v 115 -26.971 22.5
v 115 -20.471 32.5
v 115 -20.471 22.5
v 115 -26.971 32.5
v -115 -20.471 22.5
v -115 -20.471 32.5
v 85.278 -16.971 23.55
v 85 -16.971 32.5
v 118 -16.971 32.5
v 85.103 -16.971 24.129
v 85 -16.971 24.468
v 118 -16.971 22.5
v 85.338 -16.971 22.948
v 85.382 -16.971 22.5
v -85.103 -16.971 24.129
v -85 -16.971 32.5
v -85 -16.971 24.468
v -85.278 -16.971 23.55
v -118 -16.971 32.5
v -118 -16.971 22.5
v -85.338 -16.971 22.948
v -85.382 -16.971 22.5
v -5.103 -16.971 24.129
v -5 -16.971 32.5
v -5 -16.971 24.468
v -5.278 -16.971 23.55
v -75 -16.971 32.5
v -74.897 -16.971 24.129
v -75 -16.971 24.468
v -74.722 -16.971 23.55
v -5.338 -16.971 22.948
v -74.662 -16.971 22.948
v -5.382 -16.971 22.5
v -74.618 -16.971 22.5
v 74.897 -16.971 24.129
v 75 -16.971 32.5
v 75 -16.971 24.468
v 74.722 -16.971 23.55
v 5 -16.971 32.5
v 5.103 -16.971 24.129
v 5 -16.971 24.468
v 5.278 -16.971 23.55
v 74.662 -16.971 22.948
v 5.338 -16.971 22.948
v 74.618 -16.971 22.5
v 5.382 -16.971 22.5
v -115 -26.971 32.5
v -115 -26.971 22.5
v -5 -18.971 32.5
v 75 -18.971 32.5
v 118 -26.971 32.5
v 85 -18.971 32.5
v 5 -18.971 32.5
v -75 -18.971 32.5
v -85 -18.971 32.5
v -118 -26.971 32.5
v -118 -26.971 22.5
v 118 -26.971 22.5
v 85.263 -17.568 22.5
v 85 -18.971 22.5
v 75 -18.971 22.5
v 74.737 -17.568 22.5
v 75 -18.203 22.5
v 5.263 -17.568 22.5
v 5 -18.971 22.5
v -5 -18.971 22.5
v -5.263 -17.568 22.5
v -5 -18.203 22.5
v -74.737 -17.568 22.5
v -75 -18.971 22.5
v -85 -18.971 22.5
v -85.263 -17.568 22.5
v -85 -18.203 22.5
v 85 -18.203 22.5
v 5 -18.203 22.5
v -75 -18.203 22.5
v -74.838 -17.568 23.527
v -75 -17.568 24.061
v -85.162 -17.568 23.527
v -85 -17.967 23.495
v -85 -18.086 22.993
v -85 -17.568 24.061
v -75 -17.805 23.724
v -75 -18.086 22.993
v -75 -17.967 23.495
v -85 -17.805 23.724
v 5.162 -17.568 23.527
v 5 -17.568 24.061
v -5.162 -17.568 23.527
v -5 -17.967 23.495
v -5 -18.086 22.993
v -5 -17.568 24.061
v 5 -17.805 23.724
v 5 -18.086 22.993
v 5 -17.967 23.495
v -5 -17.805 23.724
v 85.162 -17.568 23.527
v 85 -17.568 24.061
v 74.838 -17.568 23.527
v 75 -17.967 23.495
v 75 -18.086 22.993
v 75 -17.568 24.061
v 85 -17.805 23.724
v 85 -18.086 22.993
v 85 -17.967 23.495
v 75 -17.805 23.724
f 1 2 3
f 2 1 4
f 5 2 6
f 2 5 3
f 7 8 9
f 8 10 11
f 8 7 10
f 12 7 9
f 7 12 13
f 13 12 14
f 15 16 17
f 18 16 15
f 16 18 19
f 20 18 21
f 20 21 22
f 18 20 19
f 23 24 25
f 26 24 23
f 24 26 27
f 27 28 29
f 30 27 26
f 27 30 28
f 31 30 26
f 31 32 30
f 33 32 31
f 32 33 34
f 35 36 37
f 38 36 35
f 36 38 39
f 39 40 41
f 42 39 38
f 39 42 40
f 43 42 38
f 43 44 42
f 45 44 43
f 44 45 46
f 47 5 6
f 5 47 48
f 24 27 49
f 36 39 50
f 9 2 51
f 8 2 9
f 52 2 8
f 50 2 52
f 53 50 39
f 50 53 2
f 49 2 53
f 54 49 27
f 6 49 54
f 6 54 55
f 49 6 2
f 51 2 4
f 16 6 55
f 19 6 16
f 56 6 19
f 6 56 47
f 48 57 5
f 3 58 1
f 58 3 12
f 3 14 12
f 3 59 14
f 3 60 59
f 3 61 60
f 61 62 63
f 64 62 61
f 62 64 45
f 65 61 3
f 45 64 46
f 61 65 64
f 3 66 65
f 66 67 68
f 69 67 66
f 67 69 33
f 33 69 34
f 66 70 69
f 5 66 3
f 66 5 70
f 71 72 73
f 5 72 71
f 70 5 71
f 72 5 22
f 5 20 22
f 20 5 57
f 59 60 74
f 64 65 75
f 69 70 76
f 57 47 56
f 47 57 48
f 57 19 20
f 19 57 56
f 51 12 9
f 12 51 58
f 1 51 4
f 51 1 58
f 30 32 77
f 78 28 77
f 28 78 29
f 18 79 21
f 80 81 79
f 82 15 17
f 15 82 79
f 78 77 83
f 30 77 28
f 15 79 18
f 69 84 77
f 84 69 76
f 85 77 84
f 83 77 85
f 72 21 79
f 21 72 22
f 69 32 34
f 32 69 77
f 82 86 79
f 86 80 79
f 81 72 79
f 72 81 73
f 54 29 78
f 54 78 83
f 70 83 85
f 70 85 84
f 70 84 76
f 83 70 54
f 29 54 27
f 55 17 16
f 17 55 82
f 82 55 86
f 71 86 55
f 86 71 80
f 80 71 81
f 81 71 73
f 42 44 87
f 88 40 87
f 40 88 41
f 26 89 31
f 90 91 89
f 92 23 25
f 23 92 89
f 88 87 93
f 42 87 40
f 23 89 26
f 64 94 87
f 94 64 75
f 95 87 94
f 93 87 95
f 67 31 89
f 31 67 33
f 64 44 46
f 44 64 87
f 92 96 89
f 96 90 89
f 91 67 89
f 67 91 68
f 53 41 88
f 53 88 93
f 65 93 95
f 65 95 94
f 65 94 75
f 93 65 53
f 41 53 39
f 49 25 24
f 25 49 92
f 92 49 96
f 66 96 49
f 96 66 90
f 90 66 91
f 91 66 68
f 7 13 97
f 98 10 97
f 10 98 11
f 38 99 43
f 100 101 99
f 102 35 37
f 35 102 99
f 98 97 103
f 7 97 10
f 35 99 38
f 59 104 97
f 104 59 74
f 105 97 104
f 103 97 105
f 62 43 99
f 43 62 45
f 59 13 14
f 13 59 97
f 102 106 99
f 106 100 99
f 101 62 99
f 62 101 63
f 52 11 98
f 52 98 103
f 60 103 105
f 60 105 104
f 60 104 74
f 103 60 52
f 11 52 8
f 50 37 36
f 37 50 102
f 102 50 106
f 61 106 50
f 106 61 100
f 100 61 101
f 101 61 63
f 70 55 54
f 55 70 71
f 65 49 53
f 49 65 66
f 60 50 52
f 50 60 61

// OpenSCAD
coast_width = 23; coast_depth = 14; coast_height = 2; coast_angle = 30;
mavis_width = 23.2; mavis_depth = 13.4; mavis_height = 2; mavis_angle = coast_angle * 2;

coast_front_bottom_height = 4.5;
coast_front_height_offset = coast_depth * sin(coast_angle);
coast_front_lateral_offset = coast_depth * cos(coast_angle);
coast_front_top_height = coast_front_bottom_height + coast_front_height_offset;

mavis_front_bottom_height = coast_front_top_height;
mavis_front_bottom_lateral_offset = coast_front_lateral_offset;
mavis_front_height_offset = mavis_depth * sin(mavis_angle);
mavis_front_lateral_offset = mavis_depth * cos(mavis_angle);

holder_distance_sides_bottom = 3;
holder_extension_sides_up = 0.3;
holder_extension_sides_frontback = 0.5;
holder_creep_sides_up = 0.8;
holder_creep_sides_bottom = 0.5;
holder_extension_clamps_depth = 0.3;

pillar_length = 35;
pillar_radius = 0.55;
ground_pillar_radius = 0.8;
pillar_faces = 32;

module pillars(bracket_width, bracket_depth, bracket_height, pillar_x, bracket_y, bracket_z, angle) {
    // Front pillar
    translate([pillar_x + bracket_width/2, bracket_y + 0.5, bracket_z]) {
        rotate([-angle, 0, 0]) {
            translate([0, 0, -pillar_length]) {
                cylinder(r=pillar_radius, h=pillar_length, $fn=pillar_faces);
            }
        }
        sphere(r=pillar_radius, $fn=pillar_faces);
    }
    // Center pillar
    translate([pillar_x + bracket_width/2, bracket_y + bracket_depth/2, bracket_z]) {
        rotate([-angle, 0, 0]) {
            translate([0, 0, -pillar_length]) {
                cylinder(r=pillar_radius, h=pillar_length, $fn=pillar_faces);
            }
        }
        sphere(r=pillar_radius, $fn=pillar_faces);
    }
    // Back pillar
    translate([pillar_x + bracket_width/2, bracket_y + bracket_depth - 1, bracket_z]) {
        rotate([-angle, 0, 0]) {
            translate([0, 0, -pillar_length]) {
                cylinder(r=pillar_radius, h=pillar_length, $fn=pillar_faces);
            }
        }
        sphere(r=pillar_radius, $fn=pillar_faces);
    }
}

module left_bracket(synth_width, synth_depth, angle) {
    bracket_x = holder_distance_sides_bottom;
    bracket_y = -holder_extension_sides_frontback;
    bracket_z = -holder_extension_sides_up;
    bracket_width = holder_creep_sides_bottom * 2;
    bracket_depth = synth_depth + 2 * holder_extension_sides_frontback;
    bracket_height = holder_extension_sides_up + holder_creep_sides_up;
    
    translate([bracket_x, bracket_y, bracket_z]) {
        cube([bracket_width, bracket_depth, bracket_height]);
    }
    pillars(bracket_width, bracket_depth, bracket_height, bracket_x, bracket_y, bracket_z, angle);
}

module center_bracket(synth_width, synth_depth, angle) {
    bracket_x = synth_width / 2 - holder_creep_sides_bottom;
    bracket_y = -holder_extension_sides_frontback;
    bracket_z = -holder_extension_sides_up;
    bracket_width = holder_creep_sides_bottom * 2;
    bracket_depth = synth_depth + 2 * holder_extension_sides_frontback;
    bracket_height = holder_extension_sides_up + holder_creep_sides_up;
    
    translate([bracket_x, bracket_y, bracket_z]) {
        cube([bracket_width, bracket_depth, bracket_height]);
    }
    pillars(bracket_width, bracket_depth, bracket_height, bracket_x, bracket_y, bracket_z, angle);
}

module right_bracket(synth_width, synth_depth, angle) {
    bracket_x = synth_width - holder_distance_sides_bottom - holder_creep_sides_bottom * 2;
    bracket_y = -holder_extension_sides_frontback;
    bracket_z = -holder_extension_sides_up;
    bracket_width = holder_creep_sides_bottom * 2;
    bracket_depth = synth_depth + 2 * holder_extension_sides_frontback;
    bracket_height = holder_extension_sides_up + holder_creep_sides_up;
    
    translate([bracket_x, bracket_y, bracket_z]) {
        cube([bracket_width, bracket_depth, bracket_height]);
    }
    pillars(bracket_width, bracket_depth, bracket_height, bracket_x, bracket_y, bracket_z, angle);
}

module coast_holder() {
    translate([-coast_width / 2, 0, 0]) {
        translate([0, 0, coast_front_bottom_height]) {
            rotate([coast_angle, 0, 0]) {
                translate([0, 0, -coast_height]) {
                    difference() {
                        union() {
                            left_bracket(coast_width, coast_depth, coast_angle);
                            center_bracket(coast_width, coast_depth, coast_angle);
                            right_bracket(coast_width, coast_depth, coast_angle);
                        }
                        cube([coast_width, coast_depth, coast_height], center=false);
                    }
                }
            }
        }
    }
}

module mavis_holder() {
    translate([-mavis_width / 2, mavis_front_bottom_lateral_offset, 0]) {
        translate([0, 0, mavis_front_bottom_height]) {
            rotate([mavis_angle, 0, 0]) {
                translate([0, 0, -mavis_height]) {
                    difference() {
                        union() {
                            left_bracket(mavis_width, mavis_depth, mavis_angle);
                            center_bracket(mavis_width, mavis_depth, mavis_angle);
                            right_bracket(mavis_width, mavis_depth, mavis_angle);
                        }
                        cube([mavis_width, mavis_depth, mavis_height], center=false);
                    }
                }
            }
        }
    }
}

module ground_cylinder(offset, width) {
   translate([0, offset, 0]) {
       rotate([0, 90, 0]) {
           cylinder(r=ground_pillar_radius, h=width, center=true, $fn=pillar_faces);
       }
       // Left end cap
       translate([-width/2, 0, 0]) {
           sphere(r=ground_pillar_radius, $fn=pillar_faces);
       }
       // Right end cap  
       translate([width/2, 0, 0]) {
           sphere(r=ground_pillar_radius, $fn=pillar_faces);
       }
   }
}

module added_mavis_holder() {
	ground_height = 0.2;
	ground_go_over = 0.15;
    scale([10, 10, 10]) {
        rotate([-mavis_angle + 90, 0, 0]) difference() {
		    translate([-mavis_width / 2, mavis_front_bottom_lateral_offset, 0]) {
		        translate([0, 0, mavis_front_bottom_height]) {
		            rotate([mavis_angle, 0, 0]) {
		            	translate([0, 0, -mavis_height - ground_height]) {
		            		cube([mavis_width, holder_creep_sides_bottom * 2, ground_height + ground_go_over]);
		            	}
		            	translate([-holder_extension_clamps_depth, 0, -mavis_height - ground_height]) {
							cube([holder_extension_clamps_depth, holder_creep_sides_bottom * 2, holder_creep_sides_up + ground_height]);
		            	}
		            	translate([mavis_width, 0, -mavis_height - ground_height]) {
							cube([holder_extension_clamps_depth, holder_creep_sides_bottom * 2, holder_creep_sides_up + ground_height]);
		            	}
		            }
		        }
		    }
            mavis_holder();
	    }
    }    
}
module added_coast_holder() {
	ground_height = 0.2;
	ground_go_over = 0.15;
    scale([10, 10, 10]) {
        rotate([-coast_angle + 90, 0, 0]) difference() {
		    translate([-coast_width / 2, 0, 0]) {
		        translate([0, 0, coast_front_bottom_height]) {
		            rotate([coast_angle, 0, 0]) {
		            	translate([0, 0, -coast_height - ground_height]) {
		            		cube([coast_width, holder_creep_sides_bottom * 2, ground_height + ground_go_over]);
		            	}
		            	translate([-holder_extension_clamps_depth, 0, -coast_height - ground_height]) {
							cube([holder_extension_clamps_depth, holder_creep_sides_bottom * 2, holder_creep_sides_up + ground_height]);
		            	}
		            	translate([coast_width, 0, -coast_height - ground_height]) {
							cube([holder_extension_clamps_depth, holder_creep_sides_bottom * 2, holder_creep_sides_up + ground_height]);
		            	}
		            }
		        }
		    }
            coast_holder();
	    }
    }    
}

// added_mavis_holder();
added_coast_holder();
